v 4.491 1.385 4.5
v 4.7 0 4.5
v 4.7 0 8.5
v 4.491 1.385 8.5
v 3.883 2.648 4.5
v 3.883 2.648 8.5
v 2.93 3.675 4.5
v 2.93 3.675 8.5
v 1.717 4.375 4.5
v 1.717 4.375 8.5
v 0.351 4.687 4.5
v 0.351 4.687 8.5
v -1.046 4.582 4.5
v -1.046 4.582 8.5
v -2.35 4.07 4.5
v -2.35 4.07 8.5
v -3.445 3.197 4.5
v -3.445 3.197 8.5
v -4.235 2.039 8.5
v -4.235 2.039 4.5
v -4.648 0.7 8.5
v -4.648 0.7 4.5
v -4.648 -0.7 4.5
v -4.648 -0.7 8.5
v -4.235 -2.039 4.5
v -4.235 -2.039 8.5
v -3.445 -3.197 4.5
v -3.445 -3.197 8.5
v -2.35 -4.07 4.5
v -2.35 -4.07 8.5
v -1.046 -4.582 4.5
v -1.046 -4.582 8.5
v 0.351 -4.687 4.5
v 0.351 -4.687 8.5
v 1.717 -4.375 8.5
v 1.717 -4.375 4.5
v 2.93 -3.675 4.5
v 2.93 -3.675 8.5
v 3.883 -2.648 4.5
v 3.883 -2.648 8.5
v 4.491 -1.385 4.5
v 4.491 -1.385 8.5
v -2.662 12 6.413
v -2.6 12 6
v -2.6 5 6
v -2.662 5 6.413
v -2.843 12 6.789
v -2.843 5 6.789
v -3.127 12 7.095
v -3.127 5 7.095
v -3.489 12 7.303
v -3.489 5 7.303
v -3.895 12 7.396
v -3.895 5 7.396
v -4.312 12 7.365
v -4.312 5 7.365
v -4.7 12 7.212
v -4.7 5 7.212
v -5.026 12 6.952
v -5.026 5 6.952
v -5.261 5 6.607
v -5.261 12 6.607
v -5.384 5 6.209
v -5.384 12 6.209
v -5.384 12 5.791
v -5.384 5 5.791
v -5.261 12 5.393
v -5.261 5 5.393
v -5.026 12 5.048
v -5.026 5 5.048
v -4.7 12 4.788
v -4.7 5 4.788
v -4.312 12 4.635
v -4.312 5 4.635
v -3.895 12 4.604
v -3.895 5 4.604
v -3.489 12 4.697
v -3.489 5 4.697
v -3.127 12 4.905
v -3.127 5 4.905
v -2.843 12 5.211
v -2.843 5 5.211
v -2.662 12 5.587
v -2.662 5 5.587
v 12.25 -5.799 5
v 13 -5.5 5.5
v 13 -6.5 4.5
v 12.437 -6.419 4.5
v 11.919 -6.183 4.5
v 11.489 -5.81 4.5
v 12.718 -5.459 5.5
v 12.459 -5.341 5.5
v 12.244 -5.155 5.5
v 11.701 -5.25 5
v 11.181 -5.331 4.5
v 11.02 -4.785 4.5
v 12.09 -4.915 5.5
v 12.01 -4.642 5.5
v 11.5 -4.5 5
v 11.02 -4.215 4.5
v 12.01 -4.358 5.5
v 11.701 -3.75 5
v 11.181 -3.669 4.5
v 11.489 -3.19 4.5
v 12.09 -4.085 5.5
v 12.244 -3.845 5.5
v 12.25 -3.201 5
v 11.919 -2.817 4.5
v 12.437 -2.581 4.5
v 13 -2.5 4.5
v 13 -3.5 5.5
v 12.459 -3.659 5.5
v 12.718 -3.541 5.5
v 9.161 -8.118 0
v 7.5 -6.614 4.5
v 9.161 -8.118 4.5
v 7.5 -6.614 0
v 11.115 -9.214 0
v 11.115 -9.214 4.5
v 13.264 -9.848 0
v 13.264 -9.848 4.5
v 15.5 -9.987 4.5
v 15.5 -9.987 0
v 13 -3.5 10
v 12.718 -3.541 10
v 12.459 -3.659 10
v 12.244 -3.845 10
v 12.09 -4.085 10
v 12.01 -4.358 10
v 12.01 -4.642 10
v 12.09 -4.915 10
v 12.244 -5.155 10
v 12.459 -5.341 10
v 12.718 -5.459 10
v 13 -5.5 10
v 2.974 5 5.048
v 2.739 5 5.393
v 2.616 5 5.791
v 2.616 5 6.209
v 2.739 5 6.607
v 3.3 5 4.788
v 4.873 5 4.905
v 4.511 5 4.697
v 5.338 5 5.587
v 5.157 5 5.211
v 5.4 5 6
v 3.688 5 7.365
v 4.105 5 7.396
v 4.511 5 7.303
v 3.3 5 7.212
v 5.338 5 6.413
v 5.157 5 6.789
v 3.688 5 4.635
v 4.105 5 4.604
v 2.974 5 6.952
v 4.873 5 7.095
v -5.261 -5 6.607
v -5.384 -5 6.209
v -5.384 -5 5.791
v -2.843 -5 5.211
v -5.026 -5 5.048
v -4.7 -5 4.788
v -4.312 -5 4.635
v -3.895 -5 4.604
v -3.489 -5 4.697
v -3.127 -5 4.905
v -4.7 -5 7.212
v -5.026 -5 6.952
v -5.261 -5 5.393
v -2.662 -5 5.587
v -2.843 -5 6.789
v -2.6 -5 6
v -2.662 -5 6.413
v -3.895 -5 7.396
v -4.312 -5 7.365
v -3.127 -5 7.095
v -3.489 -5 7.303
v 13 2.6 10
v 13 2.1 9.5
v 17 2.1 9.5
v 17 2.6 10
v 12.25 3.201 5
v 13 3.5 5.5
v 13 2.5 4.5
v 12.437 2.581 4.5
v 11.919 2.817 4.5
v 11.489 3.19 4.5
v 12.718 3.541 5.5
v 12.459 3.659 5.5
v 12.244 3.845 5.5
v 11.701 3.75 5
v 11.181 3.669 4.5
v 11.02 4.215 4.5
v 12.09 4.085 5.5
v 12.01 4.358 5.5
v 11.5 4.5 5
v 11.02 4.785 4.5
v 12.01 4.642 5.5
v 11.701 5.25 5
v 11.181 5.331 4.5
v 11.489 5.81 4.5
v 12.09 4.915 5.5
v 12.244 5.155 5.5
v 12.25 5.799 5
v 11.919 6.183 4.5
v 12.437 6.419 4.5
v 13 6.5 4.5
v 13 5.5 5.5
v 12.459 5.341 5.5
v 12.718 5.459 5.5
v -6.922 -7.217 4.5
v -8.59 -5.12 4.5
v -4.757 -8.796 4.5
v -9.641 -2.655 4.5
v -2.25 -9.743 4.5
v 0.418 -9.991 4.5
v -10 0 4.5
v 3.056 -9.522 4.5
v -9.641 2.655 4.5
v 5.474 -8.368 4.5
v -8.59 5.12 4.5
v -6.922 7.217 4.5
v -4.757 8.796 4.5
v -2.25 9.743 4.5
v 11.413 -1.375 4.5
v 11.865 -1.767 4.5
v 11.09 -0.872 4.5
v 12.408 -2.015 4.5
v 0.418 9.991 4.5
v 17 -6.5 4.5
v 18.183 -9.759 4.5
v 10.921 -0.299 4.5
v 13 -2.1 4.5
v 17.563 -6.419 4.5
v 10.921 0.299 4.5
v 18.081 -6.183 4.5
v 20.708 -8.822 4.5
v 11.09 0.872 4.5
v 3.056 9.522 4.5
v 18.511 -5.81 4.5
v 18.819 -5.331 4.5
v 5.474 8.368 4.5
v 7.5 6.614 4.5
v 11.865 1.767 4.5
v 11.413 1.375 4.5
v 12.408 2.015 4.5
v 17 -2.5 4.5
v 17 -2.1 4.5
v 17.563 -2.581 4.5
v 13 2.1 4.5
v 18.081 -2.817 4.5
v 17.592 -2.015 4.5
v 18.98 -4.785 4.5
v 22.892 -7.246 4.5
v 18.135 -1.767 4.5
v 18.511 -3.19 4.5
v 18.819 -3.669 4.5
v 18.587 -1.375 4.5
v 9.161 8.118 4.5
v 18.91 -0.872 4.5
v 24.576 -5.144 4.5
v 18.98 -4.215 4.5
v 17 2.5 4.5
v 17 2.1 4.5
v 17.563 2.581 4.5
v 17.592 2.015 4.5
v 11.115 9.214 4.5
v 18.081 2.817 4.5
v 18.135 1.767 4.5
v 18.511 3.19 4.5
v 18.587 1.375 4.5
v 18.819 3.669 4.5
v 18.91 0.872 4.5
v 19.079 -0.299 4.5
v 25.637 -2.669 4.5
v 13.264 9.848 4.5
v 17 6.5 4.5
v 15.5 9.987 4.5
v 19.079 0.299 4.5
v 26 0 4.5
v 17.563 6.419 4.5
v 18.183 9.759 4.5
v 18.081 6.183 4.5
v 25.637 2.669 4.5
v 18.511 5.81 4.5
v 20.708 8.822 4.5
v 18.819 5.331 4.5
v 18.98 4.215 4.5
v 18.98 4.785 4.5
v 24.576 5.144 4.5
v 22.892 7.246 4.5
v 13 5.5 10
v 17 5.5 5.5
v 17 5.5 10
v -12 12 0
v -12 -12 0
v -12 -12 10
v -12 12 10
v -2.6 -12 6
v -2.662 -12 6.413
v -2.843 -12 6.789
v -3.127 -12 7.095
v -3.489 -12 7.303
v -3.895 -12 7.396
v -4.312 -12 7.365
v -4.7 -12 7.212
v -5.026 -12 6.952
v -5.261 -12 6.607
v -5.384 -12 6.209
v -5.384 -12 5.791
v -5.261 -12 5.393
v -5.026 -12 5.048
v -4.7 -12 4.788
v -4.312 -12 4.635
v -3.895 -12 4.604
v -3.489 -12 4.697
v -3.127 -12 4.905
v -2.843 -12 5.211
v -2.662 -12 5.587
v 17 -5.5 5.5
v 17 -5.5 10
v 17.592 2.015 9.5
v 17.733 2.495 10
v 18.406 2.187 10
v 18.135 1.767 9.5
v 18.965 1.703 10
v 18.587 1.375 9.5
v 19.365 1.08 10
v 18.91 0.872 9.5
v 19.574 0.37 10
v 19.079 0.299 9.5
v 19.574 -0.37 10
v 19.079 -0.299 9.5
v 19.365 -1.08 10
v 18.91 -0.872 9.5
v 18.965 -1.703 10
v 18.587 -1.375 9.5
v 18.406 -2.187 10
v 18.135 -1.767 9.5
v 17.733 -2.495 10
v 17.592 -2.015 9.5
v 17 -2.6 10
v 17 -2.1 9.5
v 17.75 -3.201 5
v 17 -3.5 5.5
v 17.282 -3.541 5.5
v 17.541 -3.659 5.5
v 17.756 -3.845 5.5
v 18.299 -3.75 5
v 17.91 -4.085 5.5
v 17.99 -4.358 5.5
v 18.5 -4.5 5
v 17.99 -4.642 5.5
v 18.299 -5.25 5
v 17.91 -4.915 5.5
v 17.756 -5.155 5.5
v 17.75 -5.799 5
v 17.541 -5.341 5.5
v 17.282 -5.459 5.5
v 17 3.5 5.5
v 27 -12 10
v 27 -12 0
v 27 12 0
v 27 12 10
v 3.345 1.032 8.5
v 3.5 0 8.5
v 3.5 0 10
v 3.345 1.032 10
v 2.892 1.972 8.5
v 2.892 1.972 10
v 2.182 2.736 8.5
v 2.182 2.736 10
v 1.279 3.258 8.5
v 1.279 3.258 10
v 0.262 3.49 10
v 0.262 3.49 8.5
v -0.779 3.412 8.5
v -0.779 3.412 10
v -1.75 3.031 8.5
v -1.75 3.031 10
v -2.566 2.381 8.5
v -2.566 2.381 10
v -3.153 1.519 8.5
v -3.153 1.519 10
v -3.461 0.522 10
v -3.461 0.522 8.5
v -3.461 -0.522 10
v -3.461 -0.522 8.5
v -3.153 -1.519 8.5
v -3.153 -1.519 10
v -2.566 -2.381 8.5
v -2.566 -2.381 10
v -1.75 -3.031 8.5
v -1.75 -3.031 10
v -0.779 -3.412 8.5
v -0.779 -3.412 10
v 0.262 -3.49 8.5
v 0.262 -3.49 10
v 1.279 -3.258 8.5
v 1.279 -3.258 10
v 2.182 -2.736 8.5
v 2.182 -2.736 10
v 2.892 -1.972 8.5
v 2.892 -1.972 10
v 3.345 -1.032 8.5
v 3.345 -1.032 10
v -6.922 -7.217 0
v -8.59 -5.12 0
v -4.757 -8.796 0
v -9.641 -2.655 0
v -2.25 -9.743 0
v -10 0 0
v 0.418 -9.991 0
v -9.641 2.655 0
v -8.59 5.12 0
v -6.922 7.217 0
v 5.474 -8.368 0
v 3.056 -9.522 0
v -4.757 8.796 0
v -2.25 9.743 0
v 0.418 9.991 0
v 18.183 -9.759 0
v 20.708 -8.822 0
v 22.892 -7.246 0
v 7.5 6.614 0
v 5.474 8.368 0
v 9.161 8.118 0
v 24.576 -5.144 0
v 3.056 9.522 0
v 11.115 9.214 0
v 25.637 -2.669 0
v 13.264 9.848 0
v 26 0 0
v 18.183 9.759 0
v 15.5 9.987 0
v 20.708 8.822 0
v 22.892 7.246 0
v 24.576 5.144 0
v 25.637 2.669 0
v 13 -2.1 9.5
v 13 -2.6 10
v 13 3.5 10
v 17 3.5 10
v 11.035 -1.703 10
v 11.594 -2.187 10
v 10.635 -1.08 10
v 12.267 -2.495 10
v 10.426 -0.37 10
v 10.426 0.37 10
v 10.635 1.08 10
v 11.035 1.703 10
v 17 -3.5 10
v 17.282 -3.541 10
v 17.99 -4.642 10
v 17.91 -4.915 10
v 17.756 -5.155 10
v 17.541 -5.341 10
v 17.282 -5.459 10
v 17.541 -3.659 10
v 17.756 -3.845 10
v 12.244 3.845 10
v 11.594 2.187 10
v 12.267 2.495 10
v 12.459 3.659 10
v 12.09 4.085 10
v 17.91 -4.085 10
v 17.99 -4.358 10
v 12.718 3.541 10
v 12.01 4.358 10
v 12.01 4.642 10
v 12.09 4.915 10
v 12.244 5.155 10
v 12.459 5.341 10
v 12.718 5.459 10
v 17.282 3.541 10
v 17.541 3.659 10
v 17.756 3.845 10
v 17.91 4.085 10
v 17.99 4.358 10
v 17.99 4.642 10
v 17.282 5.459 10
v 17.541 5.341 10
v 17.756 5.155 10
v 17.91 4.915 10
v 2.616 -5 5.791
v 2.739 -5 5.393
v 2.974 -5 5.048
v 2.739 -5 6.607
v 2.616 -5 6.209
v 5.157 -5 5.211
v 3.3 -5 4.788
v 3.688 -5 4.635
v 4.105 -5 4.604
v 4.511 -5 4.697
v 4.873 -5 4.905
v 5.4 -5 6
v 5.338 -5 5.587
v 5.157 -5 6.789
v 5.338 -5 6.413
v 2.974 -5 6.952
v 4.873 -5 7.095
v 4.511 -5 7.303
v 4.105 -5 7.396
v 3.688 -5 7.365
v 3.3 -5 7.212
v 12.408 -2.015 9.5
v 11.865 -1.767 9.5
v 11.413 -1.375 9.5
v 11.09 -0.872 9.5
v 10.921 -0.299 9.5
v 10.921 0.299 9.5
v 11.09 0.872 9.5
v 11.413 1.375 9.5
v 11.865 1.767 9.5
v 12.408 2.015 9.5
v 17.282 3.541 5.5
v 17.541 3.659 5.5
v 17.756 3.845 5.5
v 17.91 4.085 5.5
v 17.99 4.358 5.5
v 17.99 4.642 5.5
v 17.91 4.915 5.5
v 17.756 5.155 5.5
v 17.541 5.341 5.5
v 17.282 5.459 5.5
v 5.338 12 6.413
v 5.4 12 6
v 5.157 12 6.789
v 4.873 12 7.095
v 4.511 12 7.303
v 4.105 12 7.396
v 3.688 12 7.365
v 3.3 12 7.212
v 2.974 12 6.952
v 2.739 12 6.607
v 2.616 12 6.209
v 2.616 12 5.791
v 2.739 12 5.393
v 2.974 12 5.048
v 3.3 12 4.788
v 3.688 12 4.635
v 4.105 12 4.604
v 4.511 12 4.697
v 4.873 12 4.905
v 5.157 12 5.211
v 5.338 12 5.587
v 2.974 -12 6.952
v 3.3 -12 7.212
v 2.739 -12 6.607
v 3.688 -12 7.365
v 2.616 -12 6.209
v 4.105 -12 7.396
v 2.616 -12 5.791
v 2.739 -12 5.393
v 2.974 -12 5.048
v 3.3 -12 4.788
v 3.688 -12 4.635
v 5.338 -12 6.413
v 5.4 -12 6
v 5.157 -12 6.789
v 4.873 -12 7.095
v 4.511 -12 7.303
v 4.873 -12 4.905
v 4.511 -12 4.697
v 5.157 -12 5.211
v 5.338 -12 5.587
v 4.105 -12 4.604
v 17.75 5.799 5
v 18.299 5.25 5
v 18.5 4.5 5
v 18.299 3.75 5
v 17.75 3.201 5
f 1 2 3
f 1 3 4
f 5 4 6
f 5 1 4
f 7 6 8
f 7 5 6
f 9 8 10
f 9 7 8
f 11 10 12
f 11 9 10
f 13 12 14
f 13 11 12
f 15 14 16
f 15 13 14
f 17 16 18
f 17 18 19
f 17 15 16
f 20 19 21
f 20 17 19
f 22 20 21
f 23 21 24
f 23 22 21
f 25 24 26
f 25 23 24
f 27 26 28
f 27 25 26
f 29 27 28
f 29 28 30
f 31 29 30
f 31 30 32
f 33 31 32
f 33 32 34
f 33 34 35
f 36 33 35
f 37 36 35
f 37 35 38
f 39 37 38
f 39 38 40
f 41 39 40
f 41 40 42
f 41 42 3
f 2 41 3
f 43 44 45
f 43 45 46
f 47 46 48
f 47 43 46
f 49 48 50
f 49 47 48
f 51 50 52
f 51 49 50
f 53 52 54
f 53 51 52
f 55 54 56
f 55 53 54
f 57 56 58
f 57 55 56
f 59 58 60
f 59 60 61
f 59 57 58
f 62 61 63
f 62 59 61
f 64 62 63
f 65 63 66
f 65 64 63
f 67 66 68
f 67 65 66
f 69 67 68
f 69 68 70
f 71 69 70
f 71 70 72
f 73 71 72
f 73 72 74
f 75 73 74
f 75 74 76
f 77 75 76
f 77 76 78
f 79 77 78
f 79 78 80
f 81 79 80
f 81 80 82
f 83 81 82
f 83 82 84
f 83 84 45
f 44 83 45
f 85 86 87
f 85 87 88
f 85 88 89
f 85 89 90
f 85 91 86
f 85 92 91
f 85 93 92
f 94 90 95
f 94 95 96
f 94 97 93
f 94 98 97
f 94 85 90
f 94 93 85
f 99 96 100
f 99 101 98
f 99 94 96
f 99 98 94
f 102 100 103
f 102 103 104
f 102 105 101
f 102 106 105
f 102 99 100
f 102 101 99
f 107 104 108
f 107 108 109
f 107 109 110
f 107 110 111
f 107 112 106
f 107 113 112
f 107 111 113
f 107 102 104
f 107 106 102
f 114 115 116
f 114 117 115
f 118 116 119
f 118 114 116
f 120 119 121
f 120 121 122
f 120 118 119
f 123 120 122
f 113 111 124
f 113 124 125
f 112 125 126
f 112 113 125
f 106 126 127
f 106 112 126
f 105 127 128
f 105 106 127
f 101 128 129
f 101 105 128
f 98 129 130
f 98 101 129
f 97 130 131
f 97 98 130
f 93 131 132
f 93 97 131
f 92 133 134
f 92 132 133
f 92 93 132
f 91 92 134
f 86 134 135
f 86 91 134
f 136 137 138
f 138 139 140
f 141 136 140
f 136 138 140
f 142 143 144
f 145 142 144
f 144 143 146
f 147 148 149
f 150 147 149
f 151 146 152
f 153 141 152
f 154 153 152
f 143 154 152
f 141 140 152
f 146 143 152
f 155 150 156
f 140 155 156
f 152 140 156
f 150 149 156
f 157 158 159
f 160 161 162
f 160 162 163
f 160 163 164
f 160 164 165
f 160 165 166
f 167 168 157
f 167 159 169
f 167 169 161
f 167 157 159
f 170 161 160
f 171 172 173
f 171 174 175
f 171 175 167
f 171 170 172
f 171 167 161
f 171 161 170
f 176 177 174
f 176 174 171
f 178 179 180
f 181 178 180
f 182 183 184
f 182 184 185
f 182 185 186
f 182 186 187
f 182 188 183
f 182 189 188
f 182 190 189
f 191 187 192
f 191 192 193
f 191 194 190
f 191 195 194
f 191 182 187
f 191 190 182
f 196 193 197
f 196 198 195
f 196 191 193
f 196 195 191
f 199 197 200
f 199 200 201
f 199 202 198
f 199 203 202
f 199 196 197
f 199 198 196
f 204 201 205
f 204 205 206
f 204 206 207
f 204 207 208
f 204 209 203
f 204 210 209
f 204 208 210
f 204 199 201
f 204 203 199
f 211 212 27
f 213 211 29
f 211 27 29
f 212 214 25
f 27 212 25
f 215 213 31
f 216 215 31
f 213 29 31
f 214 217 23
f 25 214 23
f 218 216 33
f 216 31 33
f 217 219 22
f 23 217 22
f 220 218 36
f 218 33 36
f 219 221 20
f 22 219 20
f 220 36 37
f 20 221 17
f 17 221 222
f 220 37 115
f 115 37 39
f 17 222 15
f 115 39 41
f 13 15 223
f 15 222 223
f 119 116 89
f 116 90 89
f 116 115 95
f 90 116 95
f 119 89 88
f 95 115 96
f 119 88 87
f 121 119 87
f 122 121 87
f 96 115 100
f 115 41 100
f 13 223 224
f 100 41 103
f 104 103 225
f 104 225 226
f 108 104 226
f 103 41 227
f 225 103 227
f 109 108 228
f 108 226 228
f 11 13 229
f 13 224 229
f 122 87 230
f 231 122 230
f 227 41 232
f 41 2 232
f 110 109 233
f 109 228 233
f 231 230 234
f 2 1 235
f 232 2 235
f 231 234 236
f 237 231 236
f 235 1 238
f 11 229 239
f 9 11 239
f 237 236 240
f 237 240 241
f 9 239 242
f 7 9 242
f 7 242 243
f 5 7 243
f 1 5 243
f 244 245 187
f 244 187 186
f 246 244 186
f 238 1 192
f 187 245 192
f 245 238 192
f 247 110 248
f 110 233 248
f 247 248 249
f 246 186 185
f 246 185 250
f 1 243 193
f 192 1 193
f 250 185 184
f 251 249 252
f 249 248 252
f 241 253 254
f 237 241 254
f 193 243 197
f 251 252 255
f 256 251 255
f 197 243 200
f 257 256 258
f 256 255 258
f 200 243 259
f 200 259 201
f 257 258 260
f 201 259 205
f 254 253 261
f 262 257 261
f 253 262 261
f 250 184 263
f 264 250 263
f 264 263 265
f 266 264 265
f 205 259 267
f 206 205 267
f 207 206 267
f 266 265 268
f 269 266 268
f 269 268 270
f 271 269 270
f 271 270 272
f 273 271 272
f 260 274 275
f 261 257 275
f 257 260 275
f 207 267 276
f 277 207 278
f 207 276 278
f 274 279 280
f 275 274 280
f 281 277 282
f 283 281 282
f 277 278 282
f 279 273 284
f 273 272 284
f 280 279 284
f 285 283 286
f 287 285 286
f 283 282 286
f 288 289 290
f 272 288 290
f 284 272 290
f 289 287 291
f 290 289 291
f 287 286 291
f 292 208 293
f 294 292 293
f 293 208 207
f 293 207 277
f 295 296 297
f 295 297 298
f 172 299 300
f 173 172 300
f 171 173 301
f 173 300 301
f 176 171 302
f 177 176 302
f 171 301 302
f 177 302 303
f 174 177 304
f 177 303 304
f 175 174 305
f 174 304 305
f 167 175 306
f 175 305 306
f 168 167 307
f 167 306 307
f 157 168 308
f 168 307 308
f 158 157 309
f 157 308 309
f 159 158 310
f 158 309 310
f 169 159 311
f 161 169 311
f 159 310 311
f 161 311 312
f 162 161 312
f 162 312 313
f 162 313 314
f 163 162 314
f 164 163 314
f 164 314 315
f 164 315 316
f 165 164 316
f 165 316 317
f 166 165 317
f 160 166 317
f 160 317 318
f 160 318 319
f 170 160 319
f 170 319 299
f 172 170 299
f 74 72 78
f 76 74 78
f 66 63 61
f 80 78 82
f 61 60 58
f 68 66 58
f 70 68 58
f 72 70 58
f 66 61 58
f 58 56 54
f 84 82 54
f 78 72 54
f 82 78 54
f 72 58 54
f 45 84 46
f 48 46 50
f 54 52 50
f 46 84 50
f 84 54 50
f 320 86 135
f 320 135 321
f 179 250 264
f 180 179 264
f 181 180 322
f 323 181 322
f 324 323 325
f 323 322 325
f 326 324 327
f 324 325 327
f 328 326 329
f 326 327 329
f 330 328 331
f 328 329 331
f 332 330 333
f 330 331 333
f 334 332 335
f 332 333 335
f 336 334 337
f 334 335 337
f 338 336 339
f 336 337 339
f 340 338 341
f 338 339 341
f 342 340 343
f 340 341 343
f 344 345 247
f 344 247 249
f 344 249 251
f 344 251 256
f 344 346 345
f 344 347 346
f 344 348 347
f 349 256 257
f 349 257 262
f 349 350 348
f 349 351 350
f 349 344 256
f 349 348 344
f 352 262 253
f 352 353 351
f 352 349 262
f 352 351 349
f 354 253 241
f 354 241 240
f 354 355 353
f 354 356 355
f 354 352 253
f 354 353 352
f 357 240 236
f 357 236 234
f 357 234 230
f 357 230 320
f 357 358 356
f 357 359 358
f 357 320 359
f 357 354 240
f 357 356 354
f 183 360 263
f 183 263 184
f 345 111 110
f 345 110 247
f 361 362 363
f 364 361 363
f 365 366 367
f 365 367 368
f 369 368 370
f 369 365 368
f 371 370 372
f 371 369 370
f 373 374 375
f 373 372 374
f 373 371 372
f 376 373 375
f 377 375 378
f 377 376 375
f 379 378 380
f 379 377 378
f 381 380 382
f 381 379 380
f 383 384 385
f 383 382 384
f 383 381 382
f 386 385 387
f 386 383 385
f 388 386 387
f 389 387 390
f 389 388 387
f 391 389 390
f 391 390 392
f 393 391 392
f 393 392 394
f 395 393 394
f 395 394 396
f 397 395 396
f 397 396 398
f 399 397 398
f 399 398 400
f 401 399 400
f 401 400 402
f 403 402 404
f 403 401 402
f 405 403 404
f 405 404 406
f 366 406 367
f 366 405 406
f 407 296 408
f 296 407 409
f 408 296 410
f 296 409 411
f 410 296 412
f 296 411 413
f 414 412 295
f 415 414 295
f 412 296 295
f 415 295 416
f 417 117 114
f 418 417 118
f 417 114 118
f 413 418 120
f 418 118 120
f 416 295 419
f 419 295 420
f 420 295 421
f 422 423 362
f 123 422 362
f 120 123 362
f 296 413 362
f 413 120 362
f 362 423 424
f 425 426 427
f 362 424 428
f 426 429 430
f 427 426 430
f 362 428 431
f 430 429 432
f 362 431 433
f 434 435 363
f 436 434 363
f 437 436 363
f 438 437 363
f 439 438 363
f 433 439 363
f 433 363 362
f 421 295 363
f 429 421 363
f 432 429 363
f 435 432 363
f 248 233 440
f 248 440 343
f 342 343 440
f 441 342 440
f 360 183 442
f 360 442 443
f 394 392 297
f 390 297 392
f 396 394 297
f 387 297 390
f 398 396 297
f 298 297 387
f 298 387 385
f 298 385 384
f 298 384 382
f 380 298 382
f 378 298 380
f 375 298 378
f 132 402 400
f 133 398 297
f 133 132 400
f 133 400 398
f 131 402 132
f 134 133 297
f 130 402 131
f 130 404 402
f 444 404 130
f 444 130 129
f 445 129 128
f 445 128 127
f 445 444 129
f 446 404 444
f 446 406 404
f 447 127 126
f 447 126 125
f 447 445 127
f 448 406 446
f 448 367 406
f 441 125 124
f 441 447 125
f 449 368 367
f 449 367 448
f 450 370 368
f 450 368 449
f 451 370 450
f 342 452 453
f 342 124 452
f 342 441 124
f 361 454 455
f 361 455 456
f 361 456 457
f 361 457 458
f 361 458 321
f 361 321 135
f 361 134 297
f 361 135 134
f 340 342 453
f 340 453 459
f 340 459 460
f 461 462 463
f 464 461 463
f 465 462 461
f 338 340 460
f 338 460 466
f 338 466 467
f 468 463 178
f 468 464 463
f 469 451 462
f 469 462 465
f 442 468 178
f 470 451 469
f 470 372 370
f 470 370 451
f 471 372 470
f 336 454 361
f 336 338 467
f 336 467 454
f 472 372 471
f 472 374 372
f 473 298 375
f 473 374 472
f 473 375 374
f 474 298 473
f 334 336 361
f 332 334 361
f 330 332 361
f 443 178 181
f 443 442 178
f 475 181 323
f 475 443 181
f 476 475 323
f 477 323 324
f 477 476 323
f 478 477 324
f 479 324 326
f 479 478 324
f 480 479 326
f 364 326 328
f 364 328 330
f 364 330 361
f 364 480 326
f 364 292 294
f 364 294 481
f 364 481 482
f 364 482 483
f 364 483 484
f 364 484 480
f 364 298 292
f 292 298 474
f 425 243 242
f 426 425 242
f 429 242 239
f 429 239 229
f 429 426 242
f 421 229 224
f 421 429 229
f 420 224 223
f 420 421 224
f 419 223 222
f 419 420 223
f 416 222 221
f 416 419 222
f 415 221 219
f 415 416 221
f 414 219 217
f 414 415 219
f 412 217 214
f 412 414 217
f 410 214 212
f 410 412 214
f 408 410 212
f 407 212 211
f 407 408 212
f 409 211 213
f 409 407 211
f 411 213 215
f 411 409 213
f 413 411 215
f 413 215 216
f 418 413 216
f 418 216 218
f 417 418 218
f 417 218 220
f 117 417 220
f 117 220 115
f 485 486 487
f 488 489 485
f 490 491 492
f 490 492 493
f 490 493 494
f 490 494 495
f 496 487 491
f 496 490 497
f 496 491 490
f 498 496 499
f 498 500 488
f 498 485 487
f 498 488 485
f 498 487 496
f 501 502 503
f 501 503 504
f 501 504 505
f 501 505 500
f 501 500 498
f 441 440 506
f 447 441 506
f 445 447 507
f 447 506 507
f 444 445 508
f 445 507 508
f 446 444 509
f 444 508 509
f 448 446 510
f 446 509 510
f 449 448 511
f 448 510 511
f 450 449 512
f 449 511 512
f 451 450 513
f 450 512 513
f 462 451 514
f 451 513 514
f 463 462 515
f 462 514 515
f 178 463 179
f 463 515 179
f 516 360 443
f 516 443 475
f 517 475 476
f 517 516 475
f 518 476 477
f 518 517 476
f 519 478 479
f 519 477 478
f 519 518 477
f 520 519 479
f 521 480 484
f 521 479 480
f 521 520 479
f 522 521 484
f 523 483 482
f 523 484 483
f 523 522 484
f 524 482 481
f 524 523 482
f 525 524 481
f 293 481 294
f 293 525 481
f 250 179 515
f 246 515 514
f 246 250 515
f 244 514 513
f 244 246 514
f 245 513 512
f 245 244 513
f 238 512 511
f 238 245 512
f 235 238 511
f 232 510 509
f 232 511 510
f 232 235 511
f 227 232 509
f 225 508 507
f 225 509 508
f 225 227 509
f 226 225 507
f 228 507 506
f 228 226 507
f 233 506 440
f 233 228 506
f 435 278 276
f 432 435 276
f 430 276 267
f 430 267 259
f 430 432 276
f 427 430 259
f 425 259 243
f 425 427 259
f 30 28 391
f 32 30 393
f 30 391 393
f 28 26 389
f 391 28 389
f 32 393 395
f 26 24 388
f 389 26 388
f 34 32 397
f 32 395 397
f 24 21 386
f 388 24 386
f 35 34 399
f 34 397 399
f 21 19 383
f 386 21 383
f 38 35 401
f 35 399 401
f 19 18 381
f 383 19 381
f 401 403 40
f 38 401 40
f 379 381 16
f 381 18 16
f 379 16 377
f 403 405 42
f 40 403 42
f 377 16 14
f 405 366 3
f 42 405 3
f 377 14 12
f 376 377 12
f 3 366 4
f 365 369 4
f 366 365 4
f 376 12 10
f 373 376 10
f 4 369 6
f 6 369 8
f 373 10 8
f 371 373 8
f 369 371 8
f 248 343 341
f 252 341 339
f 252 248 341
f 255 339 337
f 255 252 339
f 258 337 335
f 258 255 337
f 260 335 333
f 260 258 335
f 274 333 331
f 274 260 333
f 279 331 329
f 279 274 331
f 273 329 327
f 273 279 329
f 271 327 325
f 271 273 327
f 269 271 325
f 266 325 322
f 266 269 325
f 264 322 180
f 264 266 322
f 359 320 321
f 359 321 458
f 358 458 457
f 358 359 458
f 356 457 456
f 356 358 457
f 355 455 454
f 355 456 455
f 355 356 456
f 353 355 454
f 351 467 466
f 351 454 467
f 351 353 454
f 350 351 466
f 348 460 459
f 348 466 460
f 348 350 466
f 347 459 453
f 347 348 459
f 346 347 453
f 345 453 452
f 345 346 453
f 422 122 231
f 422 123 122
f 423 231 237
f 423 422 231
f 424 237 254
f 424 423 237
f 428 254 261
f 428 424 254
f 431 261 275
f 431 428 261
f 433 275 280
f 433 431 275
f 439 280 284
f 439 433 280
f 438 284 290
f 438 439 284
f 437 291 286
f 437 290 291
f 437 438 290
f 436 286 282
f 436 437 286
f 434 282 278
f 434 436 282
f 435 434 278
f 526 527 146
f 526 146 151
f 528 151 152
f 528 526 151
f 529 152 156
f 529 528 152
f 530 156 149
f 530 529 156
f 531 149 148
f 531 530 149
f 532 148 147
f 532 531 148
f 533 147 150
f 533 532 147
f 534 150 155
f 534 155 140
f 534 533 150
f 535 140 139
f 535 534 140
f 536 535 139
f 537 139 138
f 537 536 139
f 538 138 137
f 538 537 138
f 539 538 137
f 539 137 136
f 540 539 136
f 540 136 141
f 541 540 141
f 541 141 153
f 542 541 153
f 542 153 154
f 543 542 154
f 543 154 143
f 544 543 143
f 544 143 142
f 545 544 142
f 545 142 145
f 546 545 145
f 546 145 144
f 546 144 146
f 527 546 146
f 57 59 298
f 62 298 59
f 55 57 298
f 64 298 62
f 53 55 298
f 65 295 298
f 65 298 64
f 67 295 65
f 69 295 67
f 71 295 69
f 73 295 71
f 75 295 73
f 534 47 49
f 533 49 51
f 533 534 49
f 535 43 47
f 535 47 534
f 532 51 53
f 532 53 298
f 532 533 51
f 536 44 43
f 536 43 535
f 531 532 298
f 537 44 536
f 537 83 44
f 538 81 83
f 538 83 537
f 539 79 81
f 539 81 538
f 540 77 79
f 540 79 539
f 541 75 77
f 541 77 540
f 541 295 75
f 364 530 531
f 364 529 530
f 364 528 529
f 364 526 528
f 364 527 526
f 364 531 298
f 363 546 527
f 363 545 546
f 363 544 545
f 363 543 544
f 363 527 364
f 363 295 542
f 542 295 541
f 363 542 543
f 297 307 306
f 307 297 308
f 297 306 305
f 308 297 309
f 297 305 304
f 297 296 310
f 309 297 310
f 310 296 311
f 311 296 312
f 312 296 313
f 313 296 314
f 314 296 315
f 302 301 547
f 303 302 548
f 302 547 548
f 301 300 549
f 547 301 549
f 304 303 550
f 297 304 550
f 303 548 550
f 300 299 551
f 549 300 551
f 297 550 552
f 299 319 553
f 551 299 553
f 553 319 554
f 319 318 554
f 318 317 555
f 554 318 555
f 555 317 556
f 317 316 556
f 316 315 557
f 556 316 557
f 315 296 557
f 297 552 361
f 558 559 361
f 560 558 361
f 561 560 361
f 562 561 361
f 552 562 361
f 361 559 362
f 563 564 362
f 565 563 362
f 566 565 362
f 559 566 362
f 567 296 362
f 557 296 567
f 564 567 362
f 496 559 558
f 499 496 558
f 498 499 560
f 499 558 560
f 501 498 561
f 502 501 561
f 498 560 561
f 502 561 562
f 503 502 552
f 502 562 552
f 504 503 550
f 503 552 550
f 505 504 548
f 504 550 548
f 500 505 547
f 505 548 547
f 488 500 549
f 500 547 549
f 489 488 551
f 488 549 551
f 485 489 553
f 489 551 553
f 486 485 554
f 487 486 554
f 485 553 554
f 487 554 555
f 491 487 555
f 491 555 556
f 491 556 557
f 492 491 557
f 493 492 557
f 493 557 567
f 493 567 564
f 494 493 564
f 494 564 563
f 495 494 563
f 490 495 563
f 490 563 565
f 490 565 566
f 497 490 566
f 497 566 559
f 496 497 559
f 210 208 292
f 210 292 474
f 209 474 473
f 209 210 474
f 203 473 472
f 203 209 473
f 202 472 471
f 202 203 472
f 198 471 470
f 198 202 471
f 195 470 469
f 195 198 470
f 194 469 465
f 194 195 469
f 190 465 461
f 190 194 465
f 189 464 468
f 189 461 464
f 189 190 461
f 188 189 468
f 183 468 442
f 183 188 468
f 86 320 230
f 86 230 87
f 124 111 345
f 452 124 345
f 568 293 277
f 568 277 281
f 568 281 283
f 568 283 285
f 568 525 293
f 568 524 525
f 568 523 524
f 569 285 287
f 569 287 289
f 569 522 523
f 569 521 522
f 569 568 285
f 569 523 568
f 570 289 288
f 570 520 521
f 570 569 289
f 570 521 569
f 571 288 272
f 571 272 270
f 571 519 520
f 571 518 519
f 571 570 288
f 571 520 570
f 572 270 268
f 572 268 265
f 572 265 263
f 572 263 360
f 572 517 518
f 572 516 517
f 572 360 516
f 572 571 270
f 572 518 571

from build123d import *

# Parameters (mm, degrees)
CYLINDER028_R          = 1.4
CYLINDER028_DEPTH      = 19
CYLINDER028_ROLL_ANGLE = 90
CYLINDER031_R          = 1.4
CYLINDER031_DEPTH      = 19
CYLINDER031_ROLL_ANGLE = 90
CYLINDER032_R          = 1.4
CYLINDER032_DEPTH      = 19
CYLINDER032_ROLL_ANGLE = 90
CYLINDER027_R          = 1.4
CYLINDER027_DEPTH      = 19
CYLINDER027_ROLL_ANGLE = 90
CYLINDER021_R          = 1
CYLINDER021_DEPTH      = 30
CYLINDER022_R          = 1
CYLINDER022_DEPTH      = 30
BOX001007_W            = 4
BOX001007_H            = 4.2
BOX001007_DEPTH        = 27
CYLINDER020_R          = 2.1
CYLINDER020_DEPTH      = 30
CYLINDER023_R          = 2.1
CYLINDER023_DEPTH      = 30
CYLINDER024_R          = 1
CYLINDER024_DEPTH      = 30
BOX001008_W            = 4
BOX001008_H            = 2
BOX001008_DEPTH        = 27
CYLINDER025_R          = 1
CYLINDER025_DEPTH      = 30
BOX001009_W            = 4
BOX001009_H            = 2
BOX001009_DEPTH        = 27
CYLINDER016_R          = 3.5
CYLINDER016_DEPTH      = 30
CYLINDER017_R          = 4.7
CYLINDER017_DEPTH      = 30
CYLINDER018_R          = 10
CYLINDER018_DEPTH      = 30
CYLINDER026_R          = 10
CYLINDER026_DEPTH      = 30
CYLINDER019_R          = 10
CYLINDER019_DEPTH      = 30
BOX001006_W            = 39
BOX001006_H            = 24
BOX001006_DEPTH        = 10
CHAMFER_SIZE           = 1
CHAMFER014_SIZE        = 0.5


with BuildPart() as cylinder028:
    # Cylinder028 → Cylinder028 (new body)
    with BuildSketch(Plane.XY):
        Circle(CYLINDER028_R)
    extrude(amount=CYLINDER028_DEPTH)


with BuildPart() as cylinder028_1:
    # Cylinder028 roll: moved
    add(cylinder028.part.rotate(Axis((0, 0, 0), (1, 0, 0)), CYLINDER028_ROLL_ANGLE))


with BuildPart() as cylinder028_2:
    # Cylinder028 placement: moved
    add(cylinder028_1.part.moved(Location((4, 24, 6))))


with BuildPart() as cylinder031:
    # Cylinder031 → Cylinder031 (new body)
    with BuildSketch(Plane.XY):
        Circle(CYLINDER031_R)
    extrude(amount=CYLINDER031_DEPTH)


with BuildPart() as cylinder031_1:
    # Cylinder031 roll: moved
    add(cylinder031.part.rotate(Axis((0, 0, 0), (1, 0, 0)), CYLINDER031_ROLL_ANGLE))


with BuildPart() as cylinder031_2:
    # Cylinder031 placement: moved
    add(cylinder031_1.part.moved(Location((-4, 24, 6))))


with BuildPart() as part_mirroring:
    # Part__Mirroring: instance of Cylinder031
    add(cylinder031_2.part.mirror(Plane(origin=(0, 0, 0), x_dir=(1, 0, 0), z_dir=(0, 1, 0))))


with BuildPart() as cylinder032:
    # Cylinder032 → Cylinder032 (new body)
    with BuildSketch(Plane.XY):
        Circle(CYLINDER032_R)
    extrude(amount=CYLINDER032_DEPTH)


with BuildPart() as cylinder032_1:
    # Cylinder032 roll: moved
    add(cylinder032.part.rotate(Axis((0, 0, 0), (1, 0, 0)), CYLINDER032_ROLL_ANGLE))


with BuildPart() as cylinder032_2:
    # Cylinder032 placement: moved
    add(cylinder032_1.part.moved(Location((4, 24, 6))))


with BuildPart() as part_mirroring001:
    # Part__Mirroring001: instance of Cylinder032
    add(cylinder032_2.part.mirror(Plane(origin=(0, 0, 0), x_dir=(1, 0, 0), z_dir=(0, 1, 0))))


with BuildPart() as m3_tap_a:
    # Cylinder027 → Cylinder027 (new body)
    with BuildSketch(Plane.XY):
        Circle(CYLINDER027_R)
    extrude(amount=CYLINDER027_DEPTH)


with BuildPart() as m3_tap_a_1:
    # Cylinder027 roll: moved
    add(m3_tap_a.part.rotate(Axis((0, 0, 0), (1, 0, 0)), CYLINDER027_ROLL_ANGLE))


with BuildPart() as m3_tap_a_2:
    # Cylinder027 placement: moved
    add(m3_tap_a_1.part.moved(Location((-4, 24, 6))))

    # Fusion056: union Cylinder028, Part__Mirroring, Part__Mirroring001
    add(cylinder028_2.part)
    add(part_mirroring.part)
    add(part_mirroring001.part)


with BuildPart() as cylinder021:
    # Cylinder021 → Cylinder021 (new body)
    with BuildSketch(Plane(origin=(17, -4.5, -12.5), x_dir=(1, 0, 0), z_dir=(0, 0, 1))):
        Circle(CYLINDER021_R)
    extrude(amount=CYLINDER021_DEPTH)


with BuildPart() as cylinder022:
    # Cylinder022 → Cylinder022 (new body)
    with BuildSketch(Plane(origin=(17, 4.5, -12.5), x_dir=(1, 0, 0), z_dir=(0, 0, 1))):
        Circle(CYLINDER022_R)
    extrude(amount=CYLINDER022_DEPTH)


with BuildPart() as cube005:
    # Box001007 → Box001007 (new body)
    with BuildSketch(Plane(origin=(13, -2.1, -11), x_dir=(1, 0, 0), z_dir=(0, 0, 1))):
        with Locations((2, 2.1)):
            Rectangle(BOX001007_W, BOX001007_H)
    extrude(amount=BOX001007_DEPTH)


with BuildPart() as cylinder020:
    # Cylinder020 → Cylinder020 (new body)
    with BuildSketch(Plane(origin=(17, 0, -12.5), x_dir=(1, 0, 0), z_dir=(0, 0, 1))):
        Circle(CYLINDER020_R)
    extrude(amount=CYLINDER020_DEPTH)


with BuildPart() as cylinder023:
    # Cylinder023 → Cylinder023 (new body)
    with BuildSketch(Plane(origin=(13, 0, -12.5), x_dir=(1, 0, 0), z_dir=(0, 0, 1))):
        Circle(CYLINDER023_R)
    extrude(amount=CYLINDER023_DEPTH)


with BuildPart() as cylinder024:
    # Cylinder024 → Cylinder024 (new body)
    with BuildSketch(Plane(origin=(13, -4.5, -12.5), x_dir=(1, 0, 0), z_dir=(0, 0, 1))):
        Circle(CYLINDER024_R)
    extrude(amount=CYLINDER024_DEPTH)


with BuildPart() as cube006:
    # Box001008 → Box001008 (new body)
    with BuildSketch(Plane(origin=(13, -5.5, -11), x_dir=(1, 0, 0), z_dir=(0, 0, 1))):
        with Locations((2, 1)):
            Rectangle(BOX001008_W, BOX001008_H)
    extrude(amount=BOX001008_DEPTH)


with BuildPart() as cylinder025:
    # Cylinder025 → Cylinder025 (new body)
    with BuildSketch(Plane(origin=(13, 4.5, -12.5), x_dir=(1, 0, 0), z_dir=(0, 0, 1))):
        Circle(CYLINDER025_R)
    extrude(amount=CYLINDER025_DEPTH)


with BuildPart() as motor_slots:
    # Box001009 → Box001009 (new body)
    with BuildSketch(Plane(origin=(13, 3.5, -11), x_dir=(1, 0, 0), z_dir=(0, 0, 1))):
        with Locations((2, 1)):
            Rectangle(BOX001009_W, BOX001009_H)
    extrude(amount=BOX001009_DEPTH)

    # Fusion052: union Cylinder021, Cylinder022, Cube005, Cylinder020, Cylinder023, Cylinder024, Cube006, Cylinder025
    add(cylinder021.part)
    add(cylinder022.part)
    add(cube005.part)
    add(cylinder020.part)
    add(cylinder023.part)
    add(cylinder024.part)
    add(cube006.part)
    add(cylinder025.part)


with BuildPart() as cylinder016:
    # Cylinder016 → Cylinder016 (new body)
    with BuildSketch(Plane.XY.offset(-12)):
        Circle(CYLINDER016_R)
    extrude(amount=CYLINDER016_DEPTH)


with BuildPart() as cylinder017:
    # Cylinder017 → Cylinder017 (new body)
    with BuildSketch(Plane.XY.offset(-21.5)):
        Circle(CYLINDER017_R)
    extrude(amount=CYLINDER017_DEPTH)


with BuildPart() as cylinder018:
    # Cylinder018 → Cylinder018 (new body)
    with BuildSketch(Plane.XY.offset(-25.5)):
        Circle(CYLINDER018_R)
    extrude(amount=CYLINDER018_DEPTH)


with BuildPart() as cylinder026:
    # Cylinder026 → Cylinder026 (new body)
    with BuildSketch(Plane(origin=(15, 0, -25.5), x_dir=(1, 0, 0), z_dir=(0, 0, 1))):
        Circle(CYLINDER026_R)
    extrude(amount=CYLINDER026_DEPTH)


with BuildPart() as fusion054:
    # Cylinder019 → Cylinder019 (new body)
    with BuildSketch(Plane(origin=(16, 0, -25.5), x_dir=(1, 0, 0), z_dir=(0, 0, 1))):
        Circle(CYLINDER019_R)
    extrude(amount=CYLINDER019_DEPTH)

    # Fusion053: union Cylinder016, Cylinder017, Cylinder018, Cylinder026
    add(cylinder016.part)
    add(cylinder017.part)
    add(cylinder018.part)
    add(cylinder026.part)

    # Fusion054: union motor-slots
    add(motor_slots.part)


with BuildPart() as gearbox:
    # Box001006 → Box001006 (new body)
    with BuildSketch(Plane(origin=(-12, -12, 0), x_dir=(1, 0, 0), z_dir=(0, 0, 1))):
        with Locations((19.5, 12)):
            Rectangle(BOX001006_W, BOX001006_H)
    extrude(amount=BOX001006_DEPTH)

    # Cut005: cut Fusion054
    add(fusion054.part, mode=Mode.SUBTRACT)

    # Chamfer
    chamfer_edges = [gearbox.edges().sort_by_distance(p)[0] for p in [
        (12, 4.5, 4.5),
        (15, 3.5, 4.5),
        (17.707107, 3.792893, 4.5),
        (17.707107, 5.207107, 4.5),
        (15, 5.5, 4.5),
        (17.707107, -5.207107, 4.5),
        (17.707107, -3.792893, 4.5),
        (15, -3.5, 4.5),
        (12, -4.5, 4.5),
        (15, -5.5, 4.5),
    ]]
    chamfer(chamfer_edges, length=CHAMFER_SIZE)

    # Cut007: cut M3-tap-a
    add(m3_tap_a_2.part, mode=Mode.SUBTRACT)

    # Chamfer014
    chamfer014_edges = [gearbox.edges().sort_by_distance(p)[0] for p in [
        (18.484924, 1.484924, 10),
        (15, 2.1, 10),
        (10.9, 0, 10),
        (15, -2.1, 10),
        (18.484924, -1.484924, 10),
    ]]
    chamfer(chamfer014_edges, length=CHAMFER014_SIZE)


solid = gearbox.part
